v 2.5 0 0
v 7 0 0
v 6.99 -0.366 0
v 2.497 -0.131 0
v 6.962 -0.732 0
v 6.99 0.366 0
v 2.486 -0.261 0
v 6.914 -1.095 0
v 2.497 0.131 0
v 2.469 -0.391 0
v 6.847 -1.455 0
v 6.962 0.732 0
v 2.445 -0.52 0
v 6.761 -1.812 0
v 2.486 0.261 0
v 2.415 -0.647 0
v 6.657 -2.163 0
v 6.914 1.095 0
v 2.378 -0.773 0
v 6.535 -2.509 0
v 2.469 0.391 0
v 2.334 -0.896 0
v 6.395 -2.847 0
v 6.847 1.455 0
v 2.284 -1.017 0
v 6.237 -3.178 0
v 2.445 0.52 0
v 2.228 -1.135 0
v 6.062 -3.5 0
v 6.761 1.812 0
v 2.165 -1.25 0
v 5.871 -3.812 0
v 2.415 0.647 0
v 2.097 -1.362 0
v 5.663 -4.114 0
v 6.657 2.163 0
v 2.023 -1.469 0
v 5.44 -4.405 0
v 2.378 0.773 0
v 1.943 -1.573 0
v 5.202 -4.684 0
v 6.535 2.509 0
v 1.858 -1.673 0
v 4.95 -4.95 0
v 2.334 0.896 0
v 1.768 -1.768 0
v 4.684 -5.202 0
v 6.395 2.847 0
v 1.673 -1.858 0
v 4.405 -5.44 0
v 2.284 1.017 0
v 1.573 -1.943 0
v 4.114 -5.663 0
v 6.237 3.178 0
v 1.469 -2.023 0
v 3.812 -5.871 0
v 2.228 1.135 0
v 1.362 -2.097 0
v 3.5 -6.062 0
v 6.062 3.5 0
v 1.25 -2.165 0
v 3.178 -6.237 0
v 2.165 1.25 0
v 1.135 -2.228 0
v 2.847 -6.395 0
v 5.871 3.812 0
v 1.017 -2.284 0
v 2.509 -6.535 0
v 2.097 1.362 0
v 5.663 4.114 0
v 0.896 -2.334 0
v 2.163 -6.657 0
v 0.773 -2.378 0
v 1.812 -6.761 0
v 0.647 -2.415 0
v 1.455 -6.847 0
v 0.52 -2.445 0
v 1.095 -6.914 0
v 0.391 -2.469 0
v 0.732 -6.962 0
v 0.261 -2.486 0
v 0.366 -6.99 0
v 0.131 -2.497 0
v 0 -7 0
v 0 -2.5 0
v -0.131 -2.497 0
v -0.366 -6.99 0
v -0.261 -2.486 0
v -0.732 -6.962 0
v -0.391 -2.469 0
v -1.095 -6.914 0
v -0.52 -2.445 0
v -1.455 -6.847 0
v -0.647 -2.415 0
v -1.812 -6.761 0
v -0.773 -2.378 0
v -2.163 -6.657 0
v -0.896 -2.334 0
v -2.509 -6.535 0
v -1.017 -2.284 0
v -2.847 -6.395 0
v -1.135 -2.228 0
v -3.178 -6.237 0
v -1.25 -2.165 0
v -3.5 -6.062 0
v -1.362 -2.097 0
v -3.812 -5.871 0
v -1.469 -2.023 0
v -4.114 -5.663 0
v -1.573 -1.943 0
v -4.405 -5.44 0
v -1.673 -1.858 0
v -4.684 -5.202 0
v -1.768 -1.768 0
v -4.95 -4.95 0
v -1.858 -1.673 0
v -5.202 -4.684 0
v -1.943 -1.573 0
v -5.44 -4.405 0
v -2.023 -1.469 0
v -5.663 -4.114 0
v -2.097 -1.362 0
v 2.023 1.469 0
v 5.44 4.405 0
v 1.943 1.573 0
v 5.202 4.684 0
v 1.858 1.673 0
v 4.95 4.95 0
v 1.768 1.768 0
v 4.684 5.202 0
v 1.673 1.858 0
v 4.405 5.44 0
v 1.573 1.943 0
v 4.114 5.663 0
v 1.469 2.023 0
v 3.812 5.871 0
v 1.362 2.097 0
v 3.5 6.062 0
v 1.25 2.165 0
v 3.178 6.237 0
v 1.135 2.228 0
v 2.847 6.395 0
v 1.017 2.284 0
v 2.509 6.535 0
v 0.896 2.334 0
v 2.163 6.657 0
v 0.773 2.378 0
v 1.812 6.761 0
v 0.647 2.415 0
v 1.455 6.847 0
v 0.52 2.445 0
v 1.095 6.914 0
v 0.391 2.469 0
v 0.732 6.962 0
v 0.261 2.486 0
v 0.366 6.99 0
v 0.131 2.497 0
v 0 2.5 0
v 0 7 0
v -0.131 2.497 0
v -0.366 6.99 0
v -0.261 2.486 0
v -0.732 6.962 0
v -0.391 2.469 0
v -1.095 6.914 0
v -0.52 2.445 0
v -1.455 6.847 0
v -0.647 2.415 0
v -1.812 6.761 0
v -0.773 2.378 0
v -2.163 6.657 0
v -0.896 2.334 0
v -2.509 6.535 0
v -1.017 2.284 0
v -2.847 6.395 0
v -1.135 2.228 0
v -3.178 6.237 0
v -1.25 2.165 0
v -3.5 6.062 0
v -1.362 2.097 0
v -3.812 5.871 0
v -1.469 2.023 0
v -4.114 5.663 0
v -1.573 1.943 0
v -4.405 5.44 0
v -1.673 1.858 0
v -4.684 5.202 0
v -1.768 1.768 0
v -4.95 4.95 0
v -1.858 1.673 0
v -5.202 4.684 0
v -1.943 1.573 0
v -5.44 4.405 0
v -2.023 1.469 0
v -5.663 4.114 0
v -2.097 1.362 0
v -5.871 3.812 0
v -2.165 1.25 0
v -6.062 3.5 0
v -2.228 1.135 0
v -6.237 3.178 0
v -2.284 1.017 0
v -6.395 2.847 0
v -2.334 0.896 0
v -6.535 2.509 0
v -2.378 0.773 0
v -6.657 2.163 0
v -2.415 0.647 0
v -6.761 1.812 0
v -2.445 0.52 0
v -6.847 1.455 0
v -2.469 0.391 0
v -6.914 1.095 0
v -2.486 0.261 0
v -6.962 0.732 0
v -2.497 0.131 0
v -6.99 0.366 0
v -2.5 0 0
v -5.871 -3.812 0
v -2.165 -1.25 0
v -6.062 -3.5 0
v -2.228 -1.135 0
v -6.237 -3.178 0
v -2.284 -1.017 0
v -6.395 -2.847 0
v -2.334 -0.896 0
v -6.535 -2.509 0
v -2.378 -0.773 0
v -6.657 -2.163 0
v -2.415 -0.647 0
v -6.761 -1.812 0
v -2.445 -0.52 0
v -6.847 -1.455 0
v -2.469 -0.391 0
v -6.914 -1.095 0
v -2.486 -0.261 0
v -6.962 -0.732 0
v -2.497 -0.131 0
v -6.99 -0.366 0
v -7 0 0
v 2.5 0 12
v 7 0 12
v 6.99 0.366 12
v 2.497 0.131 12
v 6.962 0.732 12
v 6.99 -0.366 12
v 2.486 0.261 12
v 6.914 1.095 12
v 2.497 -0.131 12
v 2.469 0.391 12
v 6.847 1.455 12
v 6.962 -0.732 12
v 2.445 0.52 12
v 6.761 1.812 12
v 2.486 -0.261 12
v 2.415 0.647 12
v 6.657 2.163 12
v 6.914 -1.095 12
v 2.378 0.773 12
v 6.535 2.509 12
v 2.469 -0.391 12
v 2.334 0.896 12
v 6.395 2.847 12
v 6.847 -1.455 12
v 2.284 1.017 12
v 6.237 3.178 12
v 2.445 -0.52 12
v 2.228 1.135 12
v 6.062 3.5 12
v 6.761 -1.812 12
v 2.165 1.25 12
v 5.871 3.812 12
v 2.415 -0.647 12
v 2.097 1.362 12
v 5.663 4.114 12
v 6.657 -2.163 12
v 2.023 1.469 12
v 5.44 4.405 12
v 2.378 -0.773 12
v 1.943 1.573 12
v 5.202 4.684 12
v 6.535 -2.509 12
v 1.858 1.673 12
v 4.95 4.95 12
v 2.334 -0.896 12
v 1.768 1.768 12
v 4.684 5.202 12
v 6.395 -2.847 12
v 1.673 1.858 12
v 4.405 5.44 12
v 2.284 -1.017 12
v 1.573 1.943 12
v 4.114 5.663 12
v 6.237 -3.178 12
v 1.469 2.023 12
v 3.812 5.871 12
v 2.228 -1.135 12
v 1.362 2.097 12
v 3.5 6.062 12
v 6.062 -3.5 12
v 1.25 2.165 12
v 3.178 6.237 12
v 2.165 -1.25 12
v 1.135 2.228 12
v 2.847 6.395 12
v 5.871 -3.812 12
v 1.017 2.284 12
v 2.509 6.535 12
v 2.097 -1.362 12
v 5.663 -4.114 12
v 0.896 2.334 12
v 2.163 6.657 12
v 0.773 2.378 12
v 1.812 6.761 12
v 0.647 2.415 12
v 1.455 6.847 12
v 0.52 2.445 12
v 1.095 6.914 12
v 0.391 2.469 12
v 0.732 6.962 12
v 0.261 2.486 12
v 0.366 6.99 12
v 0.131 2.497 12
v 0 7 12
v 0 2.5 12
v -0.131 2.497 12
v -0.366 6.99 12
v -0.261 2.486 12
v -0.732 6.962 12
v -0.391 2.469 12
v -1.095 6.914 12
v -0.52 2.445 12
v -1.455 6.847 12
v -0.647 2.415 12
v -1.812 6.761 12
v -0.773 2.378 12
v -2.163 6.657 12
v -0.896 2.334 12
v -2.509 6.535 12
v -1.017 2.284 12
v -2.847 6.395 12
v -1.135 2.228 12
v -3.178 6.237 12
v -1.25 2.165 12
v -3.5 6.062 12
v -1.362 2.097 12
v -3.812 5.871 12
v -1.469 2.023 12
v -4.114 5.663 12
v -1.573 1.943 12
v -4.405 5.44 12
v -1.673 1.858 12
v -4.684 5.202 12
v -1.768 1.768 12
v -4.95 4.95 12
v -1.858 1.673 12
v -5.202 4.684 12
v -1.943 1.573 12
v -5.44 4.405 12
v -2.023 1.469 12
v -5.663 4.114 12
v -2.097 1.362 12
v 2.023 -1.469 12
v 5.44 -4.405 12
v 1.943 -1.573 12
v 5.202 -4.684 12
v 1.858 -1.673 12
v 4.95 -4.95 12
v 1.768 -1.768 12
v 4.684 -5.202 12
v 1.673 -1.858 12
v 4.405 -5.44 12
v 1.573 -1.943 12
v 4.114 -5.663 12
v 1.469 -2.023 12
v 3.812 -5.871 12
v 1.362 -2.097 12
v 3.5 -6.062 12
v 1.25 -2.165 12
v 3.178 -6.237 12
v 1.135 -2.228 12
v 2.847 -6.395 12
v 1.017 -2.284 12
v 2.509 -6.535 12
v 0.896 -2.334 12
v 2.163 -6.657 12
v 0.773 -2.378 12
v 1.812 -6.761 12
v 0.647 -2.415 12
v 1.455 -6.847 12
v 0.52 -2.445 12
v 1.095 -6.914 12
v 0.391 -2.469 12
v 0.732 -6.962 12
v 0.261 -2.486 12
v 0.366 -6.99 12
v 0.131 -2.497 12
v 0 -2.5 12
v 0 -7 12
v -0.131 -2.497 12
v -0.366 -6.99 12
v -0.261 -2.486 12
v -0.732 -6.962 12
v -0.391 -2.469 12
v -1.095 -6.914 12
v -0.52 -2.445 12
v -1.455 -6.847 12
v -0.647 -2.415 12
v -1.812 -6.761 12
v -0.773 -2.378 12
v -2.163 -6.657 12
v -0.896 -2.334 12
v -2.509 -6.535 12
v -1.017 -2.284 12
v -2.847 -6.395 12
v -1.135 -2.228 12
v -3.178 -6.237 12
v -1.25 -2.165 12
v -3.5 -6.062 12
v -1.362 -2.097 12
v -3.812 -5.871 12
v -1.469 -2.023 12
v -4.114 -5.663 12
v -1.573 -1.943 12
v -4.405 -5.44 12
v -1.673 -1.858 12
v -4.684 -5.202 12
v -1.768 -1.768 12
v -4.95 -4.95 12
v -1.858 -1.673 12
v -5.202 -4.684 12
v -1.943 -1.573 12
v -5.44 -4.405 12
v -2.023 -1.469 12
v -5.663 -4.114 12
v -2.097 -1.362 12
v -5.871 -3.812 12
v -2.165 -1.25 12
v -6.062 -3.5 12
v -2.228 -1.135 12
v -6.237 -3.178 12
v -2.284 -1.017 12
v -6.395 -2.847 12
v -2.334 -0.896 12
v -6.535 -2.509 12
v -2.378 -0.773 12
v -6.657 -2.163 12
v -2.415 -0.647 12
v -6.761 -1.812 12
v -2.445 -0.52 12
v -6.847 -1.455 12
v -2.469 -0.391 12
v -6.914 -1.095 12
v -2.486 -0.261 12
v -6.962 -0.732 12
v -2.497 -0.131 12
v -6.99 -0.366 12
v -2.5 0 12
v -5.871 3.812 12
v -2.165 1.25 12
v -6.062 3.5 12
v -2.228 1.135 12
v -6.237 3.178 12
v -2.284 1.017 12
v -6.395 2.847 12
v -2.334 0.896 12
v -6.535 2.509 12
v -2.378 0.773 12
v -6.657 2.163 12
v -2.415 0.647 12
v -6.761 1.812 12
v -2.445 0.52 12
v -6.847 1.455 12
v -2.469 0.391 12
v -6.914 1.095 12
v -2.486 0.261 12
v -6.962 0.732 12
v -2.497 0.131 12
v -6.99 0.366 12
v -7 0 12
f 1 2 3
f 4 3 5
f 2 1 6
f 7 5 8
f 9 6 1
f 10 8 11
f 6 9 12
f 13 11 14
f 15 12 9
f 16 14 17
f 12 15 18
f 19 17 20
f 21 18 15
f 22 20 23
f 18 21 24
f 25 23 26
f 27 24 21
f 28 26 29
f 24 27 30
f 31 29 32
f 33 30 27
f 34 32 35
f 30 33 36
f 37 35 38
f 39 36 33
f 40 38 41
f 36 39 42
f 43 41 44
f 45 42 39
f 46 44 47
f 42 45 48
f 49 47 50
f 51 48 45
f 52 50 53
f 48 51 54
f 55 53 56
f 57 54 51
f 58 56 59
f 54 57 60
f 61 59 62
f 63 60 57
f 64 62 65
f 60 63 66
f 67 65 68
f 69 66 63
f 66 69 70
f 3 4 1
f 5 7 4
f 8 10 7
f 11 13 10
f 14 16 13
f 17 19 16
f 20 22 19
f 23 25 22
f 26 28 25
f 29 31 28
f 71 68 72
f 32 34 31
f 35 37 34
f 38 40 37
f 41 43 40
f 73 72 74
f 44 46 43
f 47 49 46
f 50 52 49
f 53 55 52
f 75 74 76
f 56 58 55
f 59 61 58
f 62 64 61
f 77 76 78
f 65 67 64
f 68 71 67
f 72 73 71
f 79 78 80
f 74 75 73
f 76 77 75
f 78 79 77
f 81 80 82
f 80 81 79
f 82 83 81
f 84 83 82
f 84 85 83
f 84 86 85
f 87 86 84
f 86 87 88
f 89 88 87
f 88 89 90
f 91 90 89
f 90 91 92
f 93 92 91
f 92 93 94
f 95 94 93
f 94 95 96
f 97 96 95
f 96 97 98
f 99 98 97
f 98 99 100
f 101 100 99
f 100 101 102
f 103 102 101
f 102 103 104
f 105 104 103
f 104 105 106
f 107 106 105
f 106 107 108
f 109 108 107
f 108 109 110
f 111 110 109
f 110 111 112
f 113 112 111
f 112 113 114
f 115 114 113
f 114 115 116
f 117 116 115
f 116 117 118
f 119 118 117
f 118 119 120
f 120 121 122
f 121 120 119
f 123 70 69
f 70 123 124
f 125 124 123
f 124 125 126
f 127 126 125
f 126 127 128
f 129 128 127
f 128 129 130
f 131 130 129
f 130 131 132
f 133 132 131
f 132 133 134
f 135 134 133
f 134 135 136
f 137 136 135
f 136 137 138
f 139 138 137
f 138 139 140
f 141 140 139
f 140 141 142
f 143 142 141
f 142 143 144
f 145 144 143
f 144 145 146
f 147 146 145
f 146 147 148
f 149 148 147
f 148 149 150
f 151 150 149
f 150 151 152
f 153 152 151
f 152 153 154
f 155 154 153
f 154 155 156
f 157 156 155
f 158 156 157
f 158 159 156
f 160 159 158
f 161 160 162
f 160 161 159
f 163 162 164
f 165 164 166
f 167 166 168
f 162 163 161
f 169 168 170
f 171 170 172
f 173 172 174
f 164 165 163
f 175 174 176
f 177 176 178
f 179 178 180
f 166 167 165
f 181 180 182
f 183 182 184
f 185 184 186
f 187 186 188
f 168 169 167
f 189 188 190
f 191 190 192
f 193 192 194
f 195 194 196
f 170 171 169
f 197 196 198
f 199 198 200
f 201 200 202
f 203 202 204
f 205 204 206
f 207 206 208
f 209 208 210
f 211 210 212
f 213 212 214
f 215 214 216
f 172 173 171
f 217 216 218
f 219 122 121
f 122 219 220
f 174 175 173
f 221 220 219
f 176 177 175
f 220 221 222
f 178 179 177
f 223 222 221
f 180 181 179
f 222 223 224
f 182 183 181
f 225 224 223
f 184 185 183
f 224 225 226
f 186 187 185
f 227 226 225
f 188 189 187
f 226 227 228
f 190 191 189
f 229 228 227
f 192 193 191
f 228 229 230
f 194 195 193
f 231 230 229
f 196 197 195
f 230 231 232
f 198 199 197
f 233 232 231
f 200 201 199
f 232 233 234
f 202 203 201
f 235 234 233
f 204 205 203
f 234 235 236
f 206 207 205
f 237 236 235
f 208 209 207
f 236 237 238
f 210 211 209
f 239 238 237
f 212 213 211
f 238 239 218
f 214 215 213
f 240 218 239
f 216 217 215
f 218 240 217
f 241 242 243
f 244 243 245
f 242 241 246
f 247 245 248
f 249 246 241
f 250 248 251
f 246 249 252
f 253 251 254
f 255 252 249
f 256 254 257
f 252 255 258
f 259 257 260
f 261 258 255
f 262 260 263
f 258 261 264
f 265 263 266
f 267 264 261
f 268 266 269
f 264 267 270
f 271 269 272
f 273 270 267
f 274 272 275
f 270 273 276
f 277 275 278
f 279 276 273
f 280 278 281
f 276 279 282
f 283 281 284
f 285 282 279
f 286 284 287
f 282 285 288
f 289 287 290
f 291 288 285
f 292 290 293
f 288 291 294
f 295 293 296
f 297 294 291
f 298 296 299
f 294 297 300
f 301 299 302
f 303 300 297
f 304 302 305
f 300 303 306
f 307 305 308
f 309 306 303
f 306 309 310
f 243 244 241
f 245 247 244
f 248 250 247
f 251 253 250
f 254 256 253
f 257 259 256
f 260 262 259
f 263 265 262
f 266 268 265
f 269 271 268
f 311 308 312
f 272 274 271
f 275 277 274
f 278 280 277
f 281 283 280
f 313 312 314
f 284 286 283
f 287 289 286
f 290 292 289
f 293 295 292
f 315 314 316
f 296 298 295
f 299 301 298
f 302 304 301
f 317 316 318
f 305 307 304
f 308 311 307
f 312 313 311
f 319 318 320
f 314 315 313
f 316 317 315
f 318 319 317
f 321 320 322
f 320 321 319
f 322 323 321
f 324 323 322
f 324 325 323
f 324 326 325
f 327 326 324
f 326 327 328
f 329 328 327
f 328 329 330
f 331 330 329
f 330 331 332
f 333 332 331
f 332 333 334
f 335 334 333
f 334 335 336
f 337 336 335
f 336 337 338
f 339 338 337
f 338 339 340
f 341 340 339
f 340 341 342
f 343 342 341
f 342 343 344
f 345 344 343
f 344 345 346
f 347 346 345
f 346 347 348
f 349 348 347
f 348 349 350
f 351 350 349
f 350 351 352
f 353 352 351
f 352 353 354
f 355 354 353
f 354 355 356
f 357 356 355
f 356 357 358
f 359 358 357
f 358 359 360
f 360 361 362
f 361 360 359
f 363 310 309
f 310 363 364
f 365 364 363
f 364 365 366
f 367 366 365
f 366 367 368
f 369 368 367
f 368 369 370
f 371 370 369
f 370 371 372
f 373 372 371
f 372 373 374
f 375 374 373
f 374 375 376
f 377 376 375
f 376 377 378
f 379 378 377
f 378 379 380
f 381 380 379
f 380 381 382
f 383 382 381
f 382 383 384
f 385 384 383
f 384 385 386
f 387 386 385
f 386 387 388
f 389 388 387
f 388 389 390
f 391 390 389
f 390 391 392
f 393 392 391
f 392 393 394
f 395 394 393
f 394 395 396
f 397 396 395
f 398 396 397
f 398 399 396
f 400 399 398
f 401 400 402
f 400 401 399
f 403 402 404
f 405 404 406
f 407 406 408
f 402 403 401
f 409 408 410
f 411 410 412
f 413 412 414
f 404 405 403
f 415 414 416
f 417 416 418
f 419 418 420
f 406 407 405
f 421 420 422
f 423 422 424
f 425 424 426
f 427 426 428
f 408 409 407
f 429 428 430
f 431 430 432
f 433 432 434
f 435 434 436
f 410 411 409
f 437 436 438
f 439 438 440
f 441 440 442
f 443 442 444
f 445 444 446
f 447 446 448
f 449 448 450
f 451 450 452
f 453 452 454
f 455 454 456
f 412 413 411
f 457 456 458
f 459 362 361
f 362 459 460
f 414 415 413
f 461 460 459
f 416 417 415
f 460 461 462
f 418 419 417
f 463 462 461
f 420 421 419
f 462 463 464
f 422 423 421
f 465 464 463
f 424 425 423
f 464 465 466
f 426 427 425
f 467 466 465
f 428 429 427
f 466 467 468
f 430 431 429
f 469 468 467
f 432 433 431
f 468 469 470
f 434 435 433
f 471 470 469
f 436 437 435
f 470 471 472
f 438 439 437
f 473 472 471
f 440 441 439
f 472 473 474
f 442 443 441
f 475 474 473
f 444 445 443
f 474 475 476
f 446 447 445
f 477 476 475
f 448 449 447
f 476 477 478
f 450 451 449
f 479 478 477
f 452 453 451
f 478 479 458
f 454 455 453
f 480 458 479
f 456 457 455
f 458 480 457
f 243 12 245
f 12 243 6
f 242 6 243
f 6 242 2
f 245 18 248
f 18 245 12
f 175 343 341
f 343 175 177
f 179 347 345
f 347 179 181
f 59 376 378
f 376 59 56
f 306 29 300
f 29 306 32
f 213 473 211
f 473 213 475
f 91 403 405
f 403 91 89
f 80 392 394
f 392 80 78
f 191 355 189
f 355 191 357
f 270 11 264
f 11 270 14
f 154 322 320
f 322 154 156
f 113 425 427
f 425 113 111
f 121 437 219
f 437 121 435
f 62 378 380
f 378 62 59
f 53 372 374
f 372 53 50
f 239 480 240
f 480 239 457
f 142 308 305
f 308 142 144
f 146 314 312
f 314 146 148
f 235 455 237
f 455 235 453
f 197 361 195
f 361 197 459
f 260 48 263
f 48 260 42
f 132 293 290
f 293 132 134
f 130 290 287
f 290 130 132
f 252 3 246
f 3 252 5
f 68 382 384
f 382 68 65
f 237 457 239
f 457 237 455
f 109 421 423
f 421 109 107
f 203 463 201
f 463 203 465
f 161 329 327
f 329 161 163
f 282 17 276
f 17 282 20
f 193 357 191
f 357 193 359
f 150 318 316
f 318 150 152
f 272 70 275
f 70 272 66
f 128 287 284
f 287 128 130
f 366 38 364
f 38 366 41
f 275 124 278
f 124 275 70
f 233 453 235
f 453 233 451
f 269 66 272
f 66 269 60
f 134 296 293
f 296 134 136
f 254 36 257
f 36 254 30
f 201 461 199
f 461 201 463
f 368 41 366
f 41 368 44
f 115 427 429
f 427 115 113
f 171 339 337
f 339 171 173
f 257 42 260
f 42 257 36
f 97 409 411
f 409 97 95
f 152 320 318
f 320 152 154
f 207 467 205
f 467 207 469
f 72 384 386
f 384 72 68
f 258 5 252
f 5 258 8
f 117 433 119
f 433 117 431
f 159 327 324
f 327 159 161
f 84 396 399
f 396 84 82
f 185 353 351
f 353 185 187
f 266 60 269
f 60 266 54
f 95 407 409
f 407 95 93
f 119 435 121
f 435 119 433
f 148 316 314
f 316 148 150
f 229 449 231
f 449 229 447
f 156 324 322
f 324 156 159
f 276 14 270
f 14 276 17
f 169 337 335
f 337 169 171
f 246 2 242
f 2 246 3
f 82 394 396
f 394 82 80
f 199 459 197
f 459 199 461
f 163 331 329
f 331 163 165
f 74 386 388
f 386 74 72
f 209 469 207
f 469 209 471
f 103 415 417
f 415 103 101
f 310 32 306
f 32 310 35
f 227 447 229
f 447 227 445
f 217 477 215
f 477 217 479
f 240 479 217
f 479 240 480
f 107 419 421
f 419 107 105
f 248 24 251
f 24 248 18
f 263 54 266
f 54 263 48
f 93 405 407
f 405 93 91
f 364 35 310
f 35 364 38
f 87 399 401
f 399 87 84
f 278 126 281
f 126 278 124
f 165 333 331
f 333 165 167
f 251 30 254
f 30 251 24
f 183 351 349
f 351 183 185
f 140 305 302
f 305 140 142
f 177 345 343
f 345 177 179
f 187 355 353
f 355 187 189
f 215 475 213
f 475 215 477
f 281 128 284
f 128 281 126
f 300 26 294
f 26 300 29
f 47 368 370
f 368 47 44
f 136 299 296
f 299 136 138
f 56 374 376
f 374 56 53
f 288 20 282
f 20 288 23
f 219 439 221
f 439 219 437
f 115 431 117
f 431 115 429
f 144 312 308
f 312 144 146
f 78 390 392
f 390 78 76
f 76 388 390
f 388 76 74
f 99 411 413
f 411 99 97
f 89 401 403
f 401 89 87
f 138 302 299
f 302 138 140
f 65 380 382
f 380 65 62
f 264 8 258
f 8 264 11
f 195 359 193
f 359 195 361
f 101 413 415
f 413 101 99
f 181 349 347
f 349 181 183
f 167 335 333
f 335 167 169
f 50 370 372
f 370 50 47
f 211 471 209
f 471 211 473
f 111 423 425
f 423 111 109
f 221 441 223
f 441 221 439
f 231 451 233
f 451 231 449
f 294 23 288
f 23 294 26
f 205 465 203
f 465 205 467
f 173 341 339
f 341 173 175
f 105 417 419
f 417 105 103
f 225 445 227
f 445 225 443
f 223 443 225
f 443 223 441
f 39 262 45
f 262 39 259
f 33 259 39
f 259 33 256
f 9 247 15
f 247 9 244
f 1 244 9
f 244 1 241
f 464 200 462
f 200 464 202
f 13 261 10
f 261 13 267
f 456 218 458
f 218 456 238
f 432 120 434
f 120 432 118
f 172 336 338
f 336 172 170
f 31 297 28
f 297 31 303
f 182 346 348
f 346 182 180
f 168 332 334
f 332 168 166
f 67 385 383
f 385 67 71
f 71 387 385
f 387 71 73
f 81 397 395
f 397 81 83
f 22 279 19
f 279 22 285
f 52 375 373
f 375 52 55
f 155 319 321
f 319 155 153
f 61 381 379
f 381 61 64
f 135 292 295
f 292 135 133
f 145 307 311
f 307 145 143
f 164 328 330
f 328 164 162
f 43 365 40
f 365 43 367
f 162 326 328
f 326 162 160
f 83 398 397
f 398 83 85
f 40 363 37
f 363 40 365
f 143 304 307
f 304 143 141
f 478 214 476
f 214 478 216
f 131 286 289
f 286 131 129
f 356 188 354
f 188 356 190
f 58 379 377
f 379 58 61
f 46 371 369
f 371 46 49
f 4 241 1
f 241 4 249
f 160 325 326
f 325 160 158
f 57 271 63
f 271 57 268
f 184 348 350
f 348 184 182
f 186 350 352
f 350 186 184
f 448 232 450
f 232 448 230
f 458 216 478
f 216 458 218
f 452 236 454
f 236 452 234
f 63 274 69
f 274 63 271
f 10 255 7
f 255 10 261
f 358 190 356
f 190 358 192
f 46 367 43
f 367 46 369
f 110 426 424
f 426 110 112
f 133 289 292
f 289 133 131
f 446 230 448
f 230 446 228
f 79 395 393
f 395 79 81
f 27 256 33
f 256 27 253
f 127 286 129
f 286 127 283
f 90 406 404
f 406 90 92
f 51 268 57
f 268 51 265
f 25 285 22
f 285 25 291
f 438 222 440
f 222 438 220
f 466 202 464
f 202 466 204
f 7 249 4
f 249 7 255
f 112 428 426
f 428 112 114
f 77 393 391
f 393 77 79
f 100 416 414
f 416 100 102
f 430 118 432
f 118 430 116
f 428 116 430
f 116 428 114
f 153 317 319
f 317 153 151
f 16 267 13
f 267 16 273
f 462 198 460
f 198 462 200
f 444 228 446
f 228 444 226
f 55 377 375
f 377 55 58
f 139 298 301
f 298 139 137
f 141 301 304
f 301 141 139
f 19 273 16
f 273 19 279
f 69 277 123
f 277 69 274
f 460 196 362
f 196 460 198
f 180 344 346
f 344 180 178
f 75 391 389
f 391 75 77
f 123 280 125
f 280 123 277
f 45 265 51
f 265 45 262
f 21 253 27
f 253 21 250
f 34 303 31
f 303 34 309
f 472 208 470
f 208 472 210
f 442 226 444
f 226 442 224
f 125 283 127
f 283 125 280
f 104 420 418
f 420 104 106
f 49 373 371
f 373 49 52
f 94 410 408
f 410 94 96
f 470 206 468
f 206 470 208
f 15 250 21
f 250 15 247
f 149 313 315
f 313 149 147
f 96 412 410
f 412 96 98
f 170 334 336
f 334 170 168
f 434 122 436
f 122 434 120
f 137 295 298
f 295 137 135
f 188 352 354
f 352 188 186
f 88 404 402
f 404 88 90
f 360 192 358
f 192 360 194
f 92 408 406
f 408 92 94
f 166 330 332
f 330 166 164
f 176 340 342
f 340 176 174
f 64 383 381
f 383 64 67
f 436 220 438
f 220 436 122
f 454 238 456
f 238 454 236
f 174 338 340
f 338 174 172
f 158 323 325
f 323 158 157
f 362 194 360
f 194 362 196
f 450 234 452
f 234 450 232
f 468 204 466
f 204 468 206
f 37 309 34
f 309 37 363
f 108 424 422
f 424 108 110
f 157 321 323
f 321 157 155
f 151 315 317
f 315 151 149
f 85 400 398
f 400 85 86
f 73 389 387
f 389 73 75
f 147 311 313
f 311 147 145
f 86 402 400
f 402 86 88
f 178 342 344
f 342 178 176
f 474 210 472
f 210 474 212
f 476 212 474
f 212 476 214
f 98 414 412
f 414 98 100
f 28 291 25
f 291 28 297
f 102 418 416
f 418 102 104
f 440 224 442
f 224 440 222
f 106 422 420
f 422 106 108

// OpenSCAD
$fn=120;

// Timing pulley parameters
teeth = 16;
pitch_diameter = 9.75;          // mm
pitch_radius = pitch_diameter/2;

pulley_height = 12;             // mm
hub_diameter = 14;              // mm
bore_diameter = 5;              // mm

// Tooth geometry (simplified trapezoidal approximation)
tooth_height = 1.2;             // mm radial height above pitch circle
tooth_root_depth = 0.6;         // mm radial depth below pitch circle
tooth_tip_width = 1.2;          // mm tangential width at tip
tooth_root_width = 2.0;         // mm tangential width at root

// Derived
pitch_circumference = PI * pitch_diameter;
pitch = pitch_circumference / teeth;
tooth_angle = 360 / teeth;

r_root = pitch_radius - tooth_root_depth;
r_tip  = pitch_radius + tooth_height;

// Base body radius (to root circle)
body_radius = r_root;

// Tooth module: a trapezoid extruded along Z, placed at +X direction then rotated
module tooth_2d() {
    // Trapezoid centered on X axis, extending outward in +X
    // Coordinates in (x,y): x is radial, y is tangential
    polygon(points=[
        [r_root, -tooth_root_width/2],
        [r_root,  tooth_root_width/2],
        [r_tip,   tooth_tip_width/2],
        [r_tip,  -tooth_tip_width/2]
    ]);
}

module pulley() {
    difference() {
        union() {
            // Main cylinder up to root circle
            cylinder(h=pulley_height, r=body_radius);

            // Hub (optional, slightly larger)
            cylinder(h=pulley_height, r=hub_diameter/2);

            // Teeth
            for(i=[0:teeth-1]) {
                rotate([0,0,i*tooth_angle])
                    linear_extrude(height=pulley_height)
                        tooth_2d();
            }
        }

        // Bore
        translate([0,0,-1])
            cylinder(h=pulley_height+2, r=bore_diameter/2);
    }
}

pulley();
